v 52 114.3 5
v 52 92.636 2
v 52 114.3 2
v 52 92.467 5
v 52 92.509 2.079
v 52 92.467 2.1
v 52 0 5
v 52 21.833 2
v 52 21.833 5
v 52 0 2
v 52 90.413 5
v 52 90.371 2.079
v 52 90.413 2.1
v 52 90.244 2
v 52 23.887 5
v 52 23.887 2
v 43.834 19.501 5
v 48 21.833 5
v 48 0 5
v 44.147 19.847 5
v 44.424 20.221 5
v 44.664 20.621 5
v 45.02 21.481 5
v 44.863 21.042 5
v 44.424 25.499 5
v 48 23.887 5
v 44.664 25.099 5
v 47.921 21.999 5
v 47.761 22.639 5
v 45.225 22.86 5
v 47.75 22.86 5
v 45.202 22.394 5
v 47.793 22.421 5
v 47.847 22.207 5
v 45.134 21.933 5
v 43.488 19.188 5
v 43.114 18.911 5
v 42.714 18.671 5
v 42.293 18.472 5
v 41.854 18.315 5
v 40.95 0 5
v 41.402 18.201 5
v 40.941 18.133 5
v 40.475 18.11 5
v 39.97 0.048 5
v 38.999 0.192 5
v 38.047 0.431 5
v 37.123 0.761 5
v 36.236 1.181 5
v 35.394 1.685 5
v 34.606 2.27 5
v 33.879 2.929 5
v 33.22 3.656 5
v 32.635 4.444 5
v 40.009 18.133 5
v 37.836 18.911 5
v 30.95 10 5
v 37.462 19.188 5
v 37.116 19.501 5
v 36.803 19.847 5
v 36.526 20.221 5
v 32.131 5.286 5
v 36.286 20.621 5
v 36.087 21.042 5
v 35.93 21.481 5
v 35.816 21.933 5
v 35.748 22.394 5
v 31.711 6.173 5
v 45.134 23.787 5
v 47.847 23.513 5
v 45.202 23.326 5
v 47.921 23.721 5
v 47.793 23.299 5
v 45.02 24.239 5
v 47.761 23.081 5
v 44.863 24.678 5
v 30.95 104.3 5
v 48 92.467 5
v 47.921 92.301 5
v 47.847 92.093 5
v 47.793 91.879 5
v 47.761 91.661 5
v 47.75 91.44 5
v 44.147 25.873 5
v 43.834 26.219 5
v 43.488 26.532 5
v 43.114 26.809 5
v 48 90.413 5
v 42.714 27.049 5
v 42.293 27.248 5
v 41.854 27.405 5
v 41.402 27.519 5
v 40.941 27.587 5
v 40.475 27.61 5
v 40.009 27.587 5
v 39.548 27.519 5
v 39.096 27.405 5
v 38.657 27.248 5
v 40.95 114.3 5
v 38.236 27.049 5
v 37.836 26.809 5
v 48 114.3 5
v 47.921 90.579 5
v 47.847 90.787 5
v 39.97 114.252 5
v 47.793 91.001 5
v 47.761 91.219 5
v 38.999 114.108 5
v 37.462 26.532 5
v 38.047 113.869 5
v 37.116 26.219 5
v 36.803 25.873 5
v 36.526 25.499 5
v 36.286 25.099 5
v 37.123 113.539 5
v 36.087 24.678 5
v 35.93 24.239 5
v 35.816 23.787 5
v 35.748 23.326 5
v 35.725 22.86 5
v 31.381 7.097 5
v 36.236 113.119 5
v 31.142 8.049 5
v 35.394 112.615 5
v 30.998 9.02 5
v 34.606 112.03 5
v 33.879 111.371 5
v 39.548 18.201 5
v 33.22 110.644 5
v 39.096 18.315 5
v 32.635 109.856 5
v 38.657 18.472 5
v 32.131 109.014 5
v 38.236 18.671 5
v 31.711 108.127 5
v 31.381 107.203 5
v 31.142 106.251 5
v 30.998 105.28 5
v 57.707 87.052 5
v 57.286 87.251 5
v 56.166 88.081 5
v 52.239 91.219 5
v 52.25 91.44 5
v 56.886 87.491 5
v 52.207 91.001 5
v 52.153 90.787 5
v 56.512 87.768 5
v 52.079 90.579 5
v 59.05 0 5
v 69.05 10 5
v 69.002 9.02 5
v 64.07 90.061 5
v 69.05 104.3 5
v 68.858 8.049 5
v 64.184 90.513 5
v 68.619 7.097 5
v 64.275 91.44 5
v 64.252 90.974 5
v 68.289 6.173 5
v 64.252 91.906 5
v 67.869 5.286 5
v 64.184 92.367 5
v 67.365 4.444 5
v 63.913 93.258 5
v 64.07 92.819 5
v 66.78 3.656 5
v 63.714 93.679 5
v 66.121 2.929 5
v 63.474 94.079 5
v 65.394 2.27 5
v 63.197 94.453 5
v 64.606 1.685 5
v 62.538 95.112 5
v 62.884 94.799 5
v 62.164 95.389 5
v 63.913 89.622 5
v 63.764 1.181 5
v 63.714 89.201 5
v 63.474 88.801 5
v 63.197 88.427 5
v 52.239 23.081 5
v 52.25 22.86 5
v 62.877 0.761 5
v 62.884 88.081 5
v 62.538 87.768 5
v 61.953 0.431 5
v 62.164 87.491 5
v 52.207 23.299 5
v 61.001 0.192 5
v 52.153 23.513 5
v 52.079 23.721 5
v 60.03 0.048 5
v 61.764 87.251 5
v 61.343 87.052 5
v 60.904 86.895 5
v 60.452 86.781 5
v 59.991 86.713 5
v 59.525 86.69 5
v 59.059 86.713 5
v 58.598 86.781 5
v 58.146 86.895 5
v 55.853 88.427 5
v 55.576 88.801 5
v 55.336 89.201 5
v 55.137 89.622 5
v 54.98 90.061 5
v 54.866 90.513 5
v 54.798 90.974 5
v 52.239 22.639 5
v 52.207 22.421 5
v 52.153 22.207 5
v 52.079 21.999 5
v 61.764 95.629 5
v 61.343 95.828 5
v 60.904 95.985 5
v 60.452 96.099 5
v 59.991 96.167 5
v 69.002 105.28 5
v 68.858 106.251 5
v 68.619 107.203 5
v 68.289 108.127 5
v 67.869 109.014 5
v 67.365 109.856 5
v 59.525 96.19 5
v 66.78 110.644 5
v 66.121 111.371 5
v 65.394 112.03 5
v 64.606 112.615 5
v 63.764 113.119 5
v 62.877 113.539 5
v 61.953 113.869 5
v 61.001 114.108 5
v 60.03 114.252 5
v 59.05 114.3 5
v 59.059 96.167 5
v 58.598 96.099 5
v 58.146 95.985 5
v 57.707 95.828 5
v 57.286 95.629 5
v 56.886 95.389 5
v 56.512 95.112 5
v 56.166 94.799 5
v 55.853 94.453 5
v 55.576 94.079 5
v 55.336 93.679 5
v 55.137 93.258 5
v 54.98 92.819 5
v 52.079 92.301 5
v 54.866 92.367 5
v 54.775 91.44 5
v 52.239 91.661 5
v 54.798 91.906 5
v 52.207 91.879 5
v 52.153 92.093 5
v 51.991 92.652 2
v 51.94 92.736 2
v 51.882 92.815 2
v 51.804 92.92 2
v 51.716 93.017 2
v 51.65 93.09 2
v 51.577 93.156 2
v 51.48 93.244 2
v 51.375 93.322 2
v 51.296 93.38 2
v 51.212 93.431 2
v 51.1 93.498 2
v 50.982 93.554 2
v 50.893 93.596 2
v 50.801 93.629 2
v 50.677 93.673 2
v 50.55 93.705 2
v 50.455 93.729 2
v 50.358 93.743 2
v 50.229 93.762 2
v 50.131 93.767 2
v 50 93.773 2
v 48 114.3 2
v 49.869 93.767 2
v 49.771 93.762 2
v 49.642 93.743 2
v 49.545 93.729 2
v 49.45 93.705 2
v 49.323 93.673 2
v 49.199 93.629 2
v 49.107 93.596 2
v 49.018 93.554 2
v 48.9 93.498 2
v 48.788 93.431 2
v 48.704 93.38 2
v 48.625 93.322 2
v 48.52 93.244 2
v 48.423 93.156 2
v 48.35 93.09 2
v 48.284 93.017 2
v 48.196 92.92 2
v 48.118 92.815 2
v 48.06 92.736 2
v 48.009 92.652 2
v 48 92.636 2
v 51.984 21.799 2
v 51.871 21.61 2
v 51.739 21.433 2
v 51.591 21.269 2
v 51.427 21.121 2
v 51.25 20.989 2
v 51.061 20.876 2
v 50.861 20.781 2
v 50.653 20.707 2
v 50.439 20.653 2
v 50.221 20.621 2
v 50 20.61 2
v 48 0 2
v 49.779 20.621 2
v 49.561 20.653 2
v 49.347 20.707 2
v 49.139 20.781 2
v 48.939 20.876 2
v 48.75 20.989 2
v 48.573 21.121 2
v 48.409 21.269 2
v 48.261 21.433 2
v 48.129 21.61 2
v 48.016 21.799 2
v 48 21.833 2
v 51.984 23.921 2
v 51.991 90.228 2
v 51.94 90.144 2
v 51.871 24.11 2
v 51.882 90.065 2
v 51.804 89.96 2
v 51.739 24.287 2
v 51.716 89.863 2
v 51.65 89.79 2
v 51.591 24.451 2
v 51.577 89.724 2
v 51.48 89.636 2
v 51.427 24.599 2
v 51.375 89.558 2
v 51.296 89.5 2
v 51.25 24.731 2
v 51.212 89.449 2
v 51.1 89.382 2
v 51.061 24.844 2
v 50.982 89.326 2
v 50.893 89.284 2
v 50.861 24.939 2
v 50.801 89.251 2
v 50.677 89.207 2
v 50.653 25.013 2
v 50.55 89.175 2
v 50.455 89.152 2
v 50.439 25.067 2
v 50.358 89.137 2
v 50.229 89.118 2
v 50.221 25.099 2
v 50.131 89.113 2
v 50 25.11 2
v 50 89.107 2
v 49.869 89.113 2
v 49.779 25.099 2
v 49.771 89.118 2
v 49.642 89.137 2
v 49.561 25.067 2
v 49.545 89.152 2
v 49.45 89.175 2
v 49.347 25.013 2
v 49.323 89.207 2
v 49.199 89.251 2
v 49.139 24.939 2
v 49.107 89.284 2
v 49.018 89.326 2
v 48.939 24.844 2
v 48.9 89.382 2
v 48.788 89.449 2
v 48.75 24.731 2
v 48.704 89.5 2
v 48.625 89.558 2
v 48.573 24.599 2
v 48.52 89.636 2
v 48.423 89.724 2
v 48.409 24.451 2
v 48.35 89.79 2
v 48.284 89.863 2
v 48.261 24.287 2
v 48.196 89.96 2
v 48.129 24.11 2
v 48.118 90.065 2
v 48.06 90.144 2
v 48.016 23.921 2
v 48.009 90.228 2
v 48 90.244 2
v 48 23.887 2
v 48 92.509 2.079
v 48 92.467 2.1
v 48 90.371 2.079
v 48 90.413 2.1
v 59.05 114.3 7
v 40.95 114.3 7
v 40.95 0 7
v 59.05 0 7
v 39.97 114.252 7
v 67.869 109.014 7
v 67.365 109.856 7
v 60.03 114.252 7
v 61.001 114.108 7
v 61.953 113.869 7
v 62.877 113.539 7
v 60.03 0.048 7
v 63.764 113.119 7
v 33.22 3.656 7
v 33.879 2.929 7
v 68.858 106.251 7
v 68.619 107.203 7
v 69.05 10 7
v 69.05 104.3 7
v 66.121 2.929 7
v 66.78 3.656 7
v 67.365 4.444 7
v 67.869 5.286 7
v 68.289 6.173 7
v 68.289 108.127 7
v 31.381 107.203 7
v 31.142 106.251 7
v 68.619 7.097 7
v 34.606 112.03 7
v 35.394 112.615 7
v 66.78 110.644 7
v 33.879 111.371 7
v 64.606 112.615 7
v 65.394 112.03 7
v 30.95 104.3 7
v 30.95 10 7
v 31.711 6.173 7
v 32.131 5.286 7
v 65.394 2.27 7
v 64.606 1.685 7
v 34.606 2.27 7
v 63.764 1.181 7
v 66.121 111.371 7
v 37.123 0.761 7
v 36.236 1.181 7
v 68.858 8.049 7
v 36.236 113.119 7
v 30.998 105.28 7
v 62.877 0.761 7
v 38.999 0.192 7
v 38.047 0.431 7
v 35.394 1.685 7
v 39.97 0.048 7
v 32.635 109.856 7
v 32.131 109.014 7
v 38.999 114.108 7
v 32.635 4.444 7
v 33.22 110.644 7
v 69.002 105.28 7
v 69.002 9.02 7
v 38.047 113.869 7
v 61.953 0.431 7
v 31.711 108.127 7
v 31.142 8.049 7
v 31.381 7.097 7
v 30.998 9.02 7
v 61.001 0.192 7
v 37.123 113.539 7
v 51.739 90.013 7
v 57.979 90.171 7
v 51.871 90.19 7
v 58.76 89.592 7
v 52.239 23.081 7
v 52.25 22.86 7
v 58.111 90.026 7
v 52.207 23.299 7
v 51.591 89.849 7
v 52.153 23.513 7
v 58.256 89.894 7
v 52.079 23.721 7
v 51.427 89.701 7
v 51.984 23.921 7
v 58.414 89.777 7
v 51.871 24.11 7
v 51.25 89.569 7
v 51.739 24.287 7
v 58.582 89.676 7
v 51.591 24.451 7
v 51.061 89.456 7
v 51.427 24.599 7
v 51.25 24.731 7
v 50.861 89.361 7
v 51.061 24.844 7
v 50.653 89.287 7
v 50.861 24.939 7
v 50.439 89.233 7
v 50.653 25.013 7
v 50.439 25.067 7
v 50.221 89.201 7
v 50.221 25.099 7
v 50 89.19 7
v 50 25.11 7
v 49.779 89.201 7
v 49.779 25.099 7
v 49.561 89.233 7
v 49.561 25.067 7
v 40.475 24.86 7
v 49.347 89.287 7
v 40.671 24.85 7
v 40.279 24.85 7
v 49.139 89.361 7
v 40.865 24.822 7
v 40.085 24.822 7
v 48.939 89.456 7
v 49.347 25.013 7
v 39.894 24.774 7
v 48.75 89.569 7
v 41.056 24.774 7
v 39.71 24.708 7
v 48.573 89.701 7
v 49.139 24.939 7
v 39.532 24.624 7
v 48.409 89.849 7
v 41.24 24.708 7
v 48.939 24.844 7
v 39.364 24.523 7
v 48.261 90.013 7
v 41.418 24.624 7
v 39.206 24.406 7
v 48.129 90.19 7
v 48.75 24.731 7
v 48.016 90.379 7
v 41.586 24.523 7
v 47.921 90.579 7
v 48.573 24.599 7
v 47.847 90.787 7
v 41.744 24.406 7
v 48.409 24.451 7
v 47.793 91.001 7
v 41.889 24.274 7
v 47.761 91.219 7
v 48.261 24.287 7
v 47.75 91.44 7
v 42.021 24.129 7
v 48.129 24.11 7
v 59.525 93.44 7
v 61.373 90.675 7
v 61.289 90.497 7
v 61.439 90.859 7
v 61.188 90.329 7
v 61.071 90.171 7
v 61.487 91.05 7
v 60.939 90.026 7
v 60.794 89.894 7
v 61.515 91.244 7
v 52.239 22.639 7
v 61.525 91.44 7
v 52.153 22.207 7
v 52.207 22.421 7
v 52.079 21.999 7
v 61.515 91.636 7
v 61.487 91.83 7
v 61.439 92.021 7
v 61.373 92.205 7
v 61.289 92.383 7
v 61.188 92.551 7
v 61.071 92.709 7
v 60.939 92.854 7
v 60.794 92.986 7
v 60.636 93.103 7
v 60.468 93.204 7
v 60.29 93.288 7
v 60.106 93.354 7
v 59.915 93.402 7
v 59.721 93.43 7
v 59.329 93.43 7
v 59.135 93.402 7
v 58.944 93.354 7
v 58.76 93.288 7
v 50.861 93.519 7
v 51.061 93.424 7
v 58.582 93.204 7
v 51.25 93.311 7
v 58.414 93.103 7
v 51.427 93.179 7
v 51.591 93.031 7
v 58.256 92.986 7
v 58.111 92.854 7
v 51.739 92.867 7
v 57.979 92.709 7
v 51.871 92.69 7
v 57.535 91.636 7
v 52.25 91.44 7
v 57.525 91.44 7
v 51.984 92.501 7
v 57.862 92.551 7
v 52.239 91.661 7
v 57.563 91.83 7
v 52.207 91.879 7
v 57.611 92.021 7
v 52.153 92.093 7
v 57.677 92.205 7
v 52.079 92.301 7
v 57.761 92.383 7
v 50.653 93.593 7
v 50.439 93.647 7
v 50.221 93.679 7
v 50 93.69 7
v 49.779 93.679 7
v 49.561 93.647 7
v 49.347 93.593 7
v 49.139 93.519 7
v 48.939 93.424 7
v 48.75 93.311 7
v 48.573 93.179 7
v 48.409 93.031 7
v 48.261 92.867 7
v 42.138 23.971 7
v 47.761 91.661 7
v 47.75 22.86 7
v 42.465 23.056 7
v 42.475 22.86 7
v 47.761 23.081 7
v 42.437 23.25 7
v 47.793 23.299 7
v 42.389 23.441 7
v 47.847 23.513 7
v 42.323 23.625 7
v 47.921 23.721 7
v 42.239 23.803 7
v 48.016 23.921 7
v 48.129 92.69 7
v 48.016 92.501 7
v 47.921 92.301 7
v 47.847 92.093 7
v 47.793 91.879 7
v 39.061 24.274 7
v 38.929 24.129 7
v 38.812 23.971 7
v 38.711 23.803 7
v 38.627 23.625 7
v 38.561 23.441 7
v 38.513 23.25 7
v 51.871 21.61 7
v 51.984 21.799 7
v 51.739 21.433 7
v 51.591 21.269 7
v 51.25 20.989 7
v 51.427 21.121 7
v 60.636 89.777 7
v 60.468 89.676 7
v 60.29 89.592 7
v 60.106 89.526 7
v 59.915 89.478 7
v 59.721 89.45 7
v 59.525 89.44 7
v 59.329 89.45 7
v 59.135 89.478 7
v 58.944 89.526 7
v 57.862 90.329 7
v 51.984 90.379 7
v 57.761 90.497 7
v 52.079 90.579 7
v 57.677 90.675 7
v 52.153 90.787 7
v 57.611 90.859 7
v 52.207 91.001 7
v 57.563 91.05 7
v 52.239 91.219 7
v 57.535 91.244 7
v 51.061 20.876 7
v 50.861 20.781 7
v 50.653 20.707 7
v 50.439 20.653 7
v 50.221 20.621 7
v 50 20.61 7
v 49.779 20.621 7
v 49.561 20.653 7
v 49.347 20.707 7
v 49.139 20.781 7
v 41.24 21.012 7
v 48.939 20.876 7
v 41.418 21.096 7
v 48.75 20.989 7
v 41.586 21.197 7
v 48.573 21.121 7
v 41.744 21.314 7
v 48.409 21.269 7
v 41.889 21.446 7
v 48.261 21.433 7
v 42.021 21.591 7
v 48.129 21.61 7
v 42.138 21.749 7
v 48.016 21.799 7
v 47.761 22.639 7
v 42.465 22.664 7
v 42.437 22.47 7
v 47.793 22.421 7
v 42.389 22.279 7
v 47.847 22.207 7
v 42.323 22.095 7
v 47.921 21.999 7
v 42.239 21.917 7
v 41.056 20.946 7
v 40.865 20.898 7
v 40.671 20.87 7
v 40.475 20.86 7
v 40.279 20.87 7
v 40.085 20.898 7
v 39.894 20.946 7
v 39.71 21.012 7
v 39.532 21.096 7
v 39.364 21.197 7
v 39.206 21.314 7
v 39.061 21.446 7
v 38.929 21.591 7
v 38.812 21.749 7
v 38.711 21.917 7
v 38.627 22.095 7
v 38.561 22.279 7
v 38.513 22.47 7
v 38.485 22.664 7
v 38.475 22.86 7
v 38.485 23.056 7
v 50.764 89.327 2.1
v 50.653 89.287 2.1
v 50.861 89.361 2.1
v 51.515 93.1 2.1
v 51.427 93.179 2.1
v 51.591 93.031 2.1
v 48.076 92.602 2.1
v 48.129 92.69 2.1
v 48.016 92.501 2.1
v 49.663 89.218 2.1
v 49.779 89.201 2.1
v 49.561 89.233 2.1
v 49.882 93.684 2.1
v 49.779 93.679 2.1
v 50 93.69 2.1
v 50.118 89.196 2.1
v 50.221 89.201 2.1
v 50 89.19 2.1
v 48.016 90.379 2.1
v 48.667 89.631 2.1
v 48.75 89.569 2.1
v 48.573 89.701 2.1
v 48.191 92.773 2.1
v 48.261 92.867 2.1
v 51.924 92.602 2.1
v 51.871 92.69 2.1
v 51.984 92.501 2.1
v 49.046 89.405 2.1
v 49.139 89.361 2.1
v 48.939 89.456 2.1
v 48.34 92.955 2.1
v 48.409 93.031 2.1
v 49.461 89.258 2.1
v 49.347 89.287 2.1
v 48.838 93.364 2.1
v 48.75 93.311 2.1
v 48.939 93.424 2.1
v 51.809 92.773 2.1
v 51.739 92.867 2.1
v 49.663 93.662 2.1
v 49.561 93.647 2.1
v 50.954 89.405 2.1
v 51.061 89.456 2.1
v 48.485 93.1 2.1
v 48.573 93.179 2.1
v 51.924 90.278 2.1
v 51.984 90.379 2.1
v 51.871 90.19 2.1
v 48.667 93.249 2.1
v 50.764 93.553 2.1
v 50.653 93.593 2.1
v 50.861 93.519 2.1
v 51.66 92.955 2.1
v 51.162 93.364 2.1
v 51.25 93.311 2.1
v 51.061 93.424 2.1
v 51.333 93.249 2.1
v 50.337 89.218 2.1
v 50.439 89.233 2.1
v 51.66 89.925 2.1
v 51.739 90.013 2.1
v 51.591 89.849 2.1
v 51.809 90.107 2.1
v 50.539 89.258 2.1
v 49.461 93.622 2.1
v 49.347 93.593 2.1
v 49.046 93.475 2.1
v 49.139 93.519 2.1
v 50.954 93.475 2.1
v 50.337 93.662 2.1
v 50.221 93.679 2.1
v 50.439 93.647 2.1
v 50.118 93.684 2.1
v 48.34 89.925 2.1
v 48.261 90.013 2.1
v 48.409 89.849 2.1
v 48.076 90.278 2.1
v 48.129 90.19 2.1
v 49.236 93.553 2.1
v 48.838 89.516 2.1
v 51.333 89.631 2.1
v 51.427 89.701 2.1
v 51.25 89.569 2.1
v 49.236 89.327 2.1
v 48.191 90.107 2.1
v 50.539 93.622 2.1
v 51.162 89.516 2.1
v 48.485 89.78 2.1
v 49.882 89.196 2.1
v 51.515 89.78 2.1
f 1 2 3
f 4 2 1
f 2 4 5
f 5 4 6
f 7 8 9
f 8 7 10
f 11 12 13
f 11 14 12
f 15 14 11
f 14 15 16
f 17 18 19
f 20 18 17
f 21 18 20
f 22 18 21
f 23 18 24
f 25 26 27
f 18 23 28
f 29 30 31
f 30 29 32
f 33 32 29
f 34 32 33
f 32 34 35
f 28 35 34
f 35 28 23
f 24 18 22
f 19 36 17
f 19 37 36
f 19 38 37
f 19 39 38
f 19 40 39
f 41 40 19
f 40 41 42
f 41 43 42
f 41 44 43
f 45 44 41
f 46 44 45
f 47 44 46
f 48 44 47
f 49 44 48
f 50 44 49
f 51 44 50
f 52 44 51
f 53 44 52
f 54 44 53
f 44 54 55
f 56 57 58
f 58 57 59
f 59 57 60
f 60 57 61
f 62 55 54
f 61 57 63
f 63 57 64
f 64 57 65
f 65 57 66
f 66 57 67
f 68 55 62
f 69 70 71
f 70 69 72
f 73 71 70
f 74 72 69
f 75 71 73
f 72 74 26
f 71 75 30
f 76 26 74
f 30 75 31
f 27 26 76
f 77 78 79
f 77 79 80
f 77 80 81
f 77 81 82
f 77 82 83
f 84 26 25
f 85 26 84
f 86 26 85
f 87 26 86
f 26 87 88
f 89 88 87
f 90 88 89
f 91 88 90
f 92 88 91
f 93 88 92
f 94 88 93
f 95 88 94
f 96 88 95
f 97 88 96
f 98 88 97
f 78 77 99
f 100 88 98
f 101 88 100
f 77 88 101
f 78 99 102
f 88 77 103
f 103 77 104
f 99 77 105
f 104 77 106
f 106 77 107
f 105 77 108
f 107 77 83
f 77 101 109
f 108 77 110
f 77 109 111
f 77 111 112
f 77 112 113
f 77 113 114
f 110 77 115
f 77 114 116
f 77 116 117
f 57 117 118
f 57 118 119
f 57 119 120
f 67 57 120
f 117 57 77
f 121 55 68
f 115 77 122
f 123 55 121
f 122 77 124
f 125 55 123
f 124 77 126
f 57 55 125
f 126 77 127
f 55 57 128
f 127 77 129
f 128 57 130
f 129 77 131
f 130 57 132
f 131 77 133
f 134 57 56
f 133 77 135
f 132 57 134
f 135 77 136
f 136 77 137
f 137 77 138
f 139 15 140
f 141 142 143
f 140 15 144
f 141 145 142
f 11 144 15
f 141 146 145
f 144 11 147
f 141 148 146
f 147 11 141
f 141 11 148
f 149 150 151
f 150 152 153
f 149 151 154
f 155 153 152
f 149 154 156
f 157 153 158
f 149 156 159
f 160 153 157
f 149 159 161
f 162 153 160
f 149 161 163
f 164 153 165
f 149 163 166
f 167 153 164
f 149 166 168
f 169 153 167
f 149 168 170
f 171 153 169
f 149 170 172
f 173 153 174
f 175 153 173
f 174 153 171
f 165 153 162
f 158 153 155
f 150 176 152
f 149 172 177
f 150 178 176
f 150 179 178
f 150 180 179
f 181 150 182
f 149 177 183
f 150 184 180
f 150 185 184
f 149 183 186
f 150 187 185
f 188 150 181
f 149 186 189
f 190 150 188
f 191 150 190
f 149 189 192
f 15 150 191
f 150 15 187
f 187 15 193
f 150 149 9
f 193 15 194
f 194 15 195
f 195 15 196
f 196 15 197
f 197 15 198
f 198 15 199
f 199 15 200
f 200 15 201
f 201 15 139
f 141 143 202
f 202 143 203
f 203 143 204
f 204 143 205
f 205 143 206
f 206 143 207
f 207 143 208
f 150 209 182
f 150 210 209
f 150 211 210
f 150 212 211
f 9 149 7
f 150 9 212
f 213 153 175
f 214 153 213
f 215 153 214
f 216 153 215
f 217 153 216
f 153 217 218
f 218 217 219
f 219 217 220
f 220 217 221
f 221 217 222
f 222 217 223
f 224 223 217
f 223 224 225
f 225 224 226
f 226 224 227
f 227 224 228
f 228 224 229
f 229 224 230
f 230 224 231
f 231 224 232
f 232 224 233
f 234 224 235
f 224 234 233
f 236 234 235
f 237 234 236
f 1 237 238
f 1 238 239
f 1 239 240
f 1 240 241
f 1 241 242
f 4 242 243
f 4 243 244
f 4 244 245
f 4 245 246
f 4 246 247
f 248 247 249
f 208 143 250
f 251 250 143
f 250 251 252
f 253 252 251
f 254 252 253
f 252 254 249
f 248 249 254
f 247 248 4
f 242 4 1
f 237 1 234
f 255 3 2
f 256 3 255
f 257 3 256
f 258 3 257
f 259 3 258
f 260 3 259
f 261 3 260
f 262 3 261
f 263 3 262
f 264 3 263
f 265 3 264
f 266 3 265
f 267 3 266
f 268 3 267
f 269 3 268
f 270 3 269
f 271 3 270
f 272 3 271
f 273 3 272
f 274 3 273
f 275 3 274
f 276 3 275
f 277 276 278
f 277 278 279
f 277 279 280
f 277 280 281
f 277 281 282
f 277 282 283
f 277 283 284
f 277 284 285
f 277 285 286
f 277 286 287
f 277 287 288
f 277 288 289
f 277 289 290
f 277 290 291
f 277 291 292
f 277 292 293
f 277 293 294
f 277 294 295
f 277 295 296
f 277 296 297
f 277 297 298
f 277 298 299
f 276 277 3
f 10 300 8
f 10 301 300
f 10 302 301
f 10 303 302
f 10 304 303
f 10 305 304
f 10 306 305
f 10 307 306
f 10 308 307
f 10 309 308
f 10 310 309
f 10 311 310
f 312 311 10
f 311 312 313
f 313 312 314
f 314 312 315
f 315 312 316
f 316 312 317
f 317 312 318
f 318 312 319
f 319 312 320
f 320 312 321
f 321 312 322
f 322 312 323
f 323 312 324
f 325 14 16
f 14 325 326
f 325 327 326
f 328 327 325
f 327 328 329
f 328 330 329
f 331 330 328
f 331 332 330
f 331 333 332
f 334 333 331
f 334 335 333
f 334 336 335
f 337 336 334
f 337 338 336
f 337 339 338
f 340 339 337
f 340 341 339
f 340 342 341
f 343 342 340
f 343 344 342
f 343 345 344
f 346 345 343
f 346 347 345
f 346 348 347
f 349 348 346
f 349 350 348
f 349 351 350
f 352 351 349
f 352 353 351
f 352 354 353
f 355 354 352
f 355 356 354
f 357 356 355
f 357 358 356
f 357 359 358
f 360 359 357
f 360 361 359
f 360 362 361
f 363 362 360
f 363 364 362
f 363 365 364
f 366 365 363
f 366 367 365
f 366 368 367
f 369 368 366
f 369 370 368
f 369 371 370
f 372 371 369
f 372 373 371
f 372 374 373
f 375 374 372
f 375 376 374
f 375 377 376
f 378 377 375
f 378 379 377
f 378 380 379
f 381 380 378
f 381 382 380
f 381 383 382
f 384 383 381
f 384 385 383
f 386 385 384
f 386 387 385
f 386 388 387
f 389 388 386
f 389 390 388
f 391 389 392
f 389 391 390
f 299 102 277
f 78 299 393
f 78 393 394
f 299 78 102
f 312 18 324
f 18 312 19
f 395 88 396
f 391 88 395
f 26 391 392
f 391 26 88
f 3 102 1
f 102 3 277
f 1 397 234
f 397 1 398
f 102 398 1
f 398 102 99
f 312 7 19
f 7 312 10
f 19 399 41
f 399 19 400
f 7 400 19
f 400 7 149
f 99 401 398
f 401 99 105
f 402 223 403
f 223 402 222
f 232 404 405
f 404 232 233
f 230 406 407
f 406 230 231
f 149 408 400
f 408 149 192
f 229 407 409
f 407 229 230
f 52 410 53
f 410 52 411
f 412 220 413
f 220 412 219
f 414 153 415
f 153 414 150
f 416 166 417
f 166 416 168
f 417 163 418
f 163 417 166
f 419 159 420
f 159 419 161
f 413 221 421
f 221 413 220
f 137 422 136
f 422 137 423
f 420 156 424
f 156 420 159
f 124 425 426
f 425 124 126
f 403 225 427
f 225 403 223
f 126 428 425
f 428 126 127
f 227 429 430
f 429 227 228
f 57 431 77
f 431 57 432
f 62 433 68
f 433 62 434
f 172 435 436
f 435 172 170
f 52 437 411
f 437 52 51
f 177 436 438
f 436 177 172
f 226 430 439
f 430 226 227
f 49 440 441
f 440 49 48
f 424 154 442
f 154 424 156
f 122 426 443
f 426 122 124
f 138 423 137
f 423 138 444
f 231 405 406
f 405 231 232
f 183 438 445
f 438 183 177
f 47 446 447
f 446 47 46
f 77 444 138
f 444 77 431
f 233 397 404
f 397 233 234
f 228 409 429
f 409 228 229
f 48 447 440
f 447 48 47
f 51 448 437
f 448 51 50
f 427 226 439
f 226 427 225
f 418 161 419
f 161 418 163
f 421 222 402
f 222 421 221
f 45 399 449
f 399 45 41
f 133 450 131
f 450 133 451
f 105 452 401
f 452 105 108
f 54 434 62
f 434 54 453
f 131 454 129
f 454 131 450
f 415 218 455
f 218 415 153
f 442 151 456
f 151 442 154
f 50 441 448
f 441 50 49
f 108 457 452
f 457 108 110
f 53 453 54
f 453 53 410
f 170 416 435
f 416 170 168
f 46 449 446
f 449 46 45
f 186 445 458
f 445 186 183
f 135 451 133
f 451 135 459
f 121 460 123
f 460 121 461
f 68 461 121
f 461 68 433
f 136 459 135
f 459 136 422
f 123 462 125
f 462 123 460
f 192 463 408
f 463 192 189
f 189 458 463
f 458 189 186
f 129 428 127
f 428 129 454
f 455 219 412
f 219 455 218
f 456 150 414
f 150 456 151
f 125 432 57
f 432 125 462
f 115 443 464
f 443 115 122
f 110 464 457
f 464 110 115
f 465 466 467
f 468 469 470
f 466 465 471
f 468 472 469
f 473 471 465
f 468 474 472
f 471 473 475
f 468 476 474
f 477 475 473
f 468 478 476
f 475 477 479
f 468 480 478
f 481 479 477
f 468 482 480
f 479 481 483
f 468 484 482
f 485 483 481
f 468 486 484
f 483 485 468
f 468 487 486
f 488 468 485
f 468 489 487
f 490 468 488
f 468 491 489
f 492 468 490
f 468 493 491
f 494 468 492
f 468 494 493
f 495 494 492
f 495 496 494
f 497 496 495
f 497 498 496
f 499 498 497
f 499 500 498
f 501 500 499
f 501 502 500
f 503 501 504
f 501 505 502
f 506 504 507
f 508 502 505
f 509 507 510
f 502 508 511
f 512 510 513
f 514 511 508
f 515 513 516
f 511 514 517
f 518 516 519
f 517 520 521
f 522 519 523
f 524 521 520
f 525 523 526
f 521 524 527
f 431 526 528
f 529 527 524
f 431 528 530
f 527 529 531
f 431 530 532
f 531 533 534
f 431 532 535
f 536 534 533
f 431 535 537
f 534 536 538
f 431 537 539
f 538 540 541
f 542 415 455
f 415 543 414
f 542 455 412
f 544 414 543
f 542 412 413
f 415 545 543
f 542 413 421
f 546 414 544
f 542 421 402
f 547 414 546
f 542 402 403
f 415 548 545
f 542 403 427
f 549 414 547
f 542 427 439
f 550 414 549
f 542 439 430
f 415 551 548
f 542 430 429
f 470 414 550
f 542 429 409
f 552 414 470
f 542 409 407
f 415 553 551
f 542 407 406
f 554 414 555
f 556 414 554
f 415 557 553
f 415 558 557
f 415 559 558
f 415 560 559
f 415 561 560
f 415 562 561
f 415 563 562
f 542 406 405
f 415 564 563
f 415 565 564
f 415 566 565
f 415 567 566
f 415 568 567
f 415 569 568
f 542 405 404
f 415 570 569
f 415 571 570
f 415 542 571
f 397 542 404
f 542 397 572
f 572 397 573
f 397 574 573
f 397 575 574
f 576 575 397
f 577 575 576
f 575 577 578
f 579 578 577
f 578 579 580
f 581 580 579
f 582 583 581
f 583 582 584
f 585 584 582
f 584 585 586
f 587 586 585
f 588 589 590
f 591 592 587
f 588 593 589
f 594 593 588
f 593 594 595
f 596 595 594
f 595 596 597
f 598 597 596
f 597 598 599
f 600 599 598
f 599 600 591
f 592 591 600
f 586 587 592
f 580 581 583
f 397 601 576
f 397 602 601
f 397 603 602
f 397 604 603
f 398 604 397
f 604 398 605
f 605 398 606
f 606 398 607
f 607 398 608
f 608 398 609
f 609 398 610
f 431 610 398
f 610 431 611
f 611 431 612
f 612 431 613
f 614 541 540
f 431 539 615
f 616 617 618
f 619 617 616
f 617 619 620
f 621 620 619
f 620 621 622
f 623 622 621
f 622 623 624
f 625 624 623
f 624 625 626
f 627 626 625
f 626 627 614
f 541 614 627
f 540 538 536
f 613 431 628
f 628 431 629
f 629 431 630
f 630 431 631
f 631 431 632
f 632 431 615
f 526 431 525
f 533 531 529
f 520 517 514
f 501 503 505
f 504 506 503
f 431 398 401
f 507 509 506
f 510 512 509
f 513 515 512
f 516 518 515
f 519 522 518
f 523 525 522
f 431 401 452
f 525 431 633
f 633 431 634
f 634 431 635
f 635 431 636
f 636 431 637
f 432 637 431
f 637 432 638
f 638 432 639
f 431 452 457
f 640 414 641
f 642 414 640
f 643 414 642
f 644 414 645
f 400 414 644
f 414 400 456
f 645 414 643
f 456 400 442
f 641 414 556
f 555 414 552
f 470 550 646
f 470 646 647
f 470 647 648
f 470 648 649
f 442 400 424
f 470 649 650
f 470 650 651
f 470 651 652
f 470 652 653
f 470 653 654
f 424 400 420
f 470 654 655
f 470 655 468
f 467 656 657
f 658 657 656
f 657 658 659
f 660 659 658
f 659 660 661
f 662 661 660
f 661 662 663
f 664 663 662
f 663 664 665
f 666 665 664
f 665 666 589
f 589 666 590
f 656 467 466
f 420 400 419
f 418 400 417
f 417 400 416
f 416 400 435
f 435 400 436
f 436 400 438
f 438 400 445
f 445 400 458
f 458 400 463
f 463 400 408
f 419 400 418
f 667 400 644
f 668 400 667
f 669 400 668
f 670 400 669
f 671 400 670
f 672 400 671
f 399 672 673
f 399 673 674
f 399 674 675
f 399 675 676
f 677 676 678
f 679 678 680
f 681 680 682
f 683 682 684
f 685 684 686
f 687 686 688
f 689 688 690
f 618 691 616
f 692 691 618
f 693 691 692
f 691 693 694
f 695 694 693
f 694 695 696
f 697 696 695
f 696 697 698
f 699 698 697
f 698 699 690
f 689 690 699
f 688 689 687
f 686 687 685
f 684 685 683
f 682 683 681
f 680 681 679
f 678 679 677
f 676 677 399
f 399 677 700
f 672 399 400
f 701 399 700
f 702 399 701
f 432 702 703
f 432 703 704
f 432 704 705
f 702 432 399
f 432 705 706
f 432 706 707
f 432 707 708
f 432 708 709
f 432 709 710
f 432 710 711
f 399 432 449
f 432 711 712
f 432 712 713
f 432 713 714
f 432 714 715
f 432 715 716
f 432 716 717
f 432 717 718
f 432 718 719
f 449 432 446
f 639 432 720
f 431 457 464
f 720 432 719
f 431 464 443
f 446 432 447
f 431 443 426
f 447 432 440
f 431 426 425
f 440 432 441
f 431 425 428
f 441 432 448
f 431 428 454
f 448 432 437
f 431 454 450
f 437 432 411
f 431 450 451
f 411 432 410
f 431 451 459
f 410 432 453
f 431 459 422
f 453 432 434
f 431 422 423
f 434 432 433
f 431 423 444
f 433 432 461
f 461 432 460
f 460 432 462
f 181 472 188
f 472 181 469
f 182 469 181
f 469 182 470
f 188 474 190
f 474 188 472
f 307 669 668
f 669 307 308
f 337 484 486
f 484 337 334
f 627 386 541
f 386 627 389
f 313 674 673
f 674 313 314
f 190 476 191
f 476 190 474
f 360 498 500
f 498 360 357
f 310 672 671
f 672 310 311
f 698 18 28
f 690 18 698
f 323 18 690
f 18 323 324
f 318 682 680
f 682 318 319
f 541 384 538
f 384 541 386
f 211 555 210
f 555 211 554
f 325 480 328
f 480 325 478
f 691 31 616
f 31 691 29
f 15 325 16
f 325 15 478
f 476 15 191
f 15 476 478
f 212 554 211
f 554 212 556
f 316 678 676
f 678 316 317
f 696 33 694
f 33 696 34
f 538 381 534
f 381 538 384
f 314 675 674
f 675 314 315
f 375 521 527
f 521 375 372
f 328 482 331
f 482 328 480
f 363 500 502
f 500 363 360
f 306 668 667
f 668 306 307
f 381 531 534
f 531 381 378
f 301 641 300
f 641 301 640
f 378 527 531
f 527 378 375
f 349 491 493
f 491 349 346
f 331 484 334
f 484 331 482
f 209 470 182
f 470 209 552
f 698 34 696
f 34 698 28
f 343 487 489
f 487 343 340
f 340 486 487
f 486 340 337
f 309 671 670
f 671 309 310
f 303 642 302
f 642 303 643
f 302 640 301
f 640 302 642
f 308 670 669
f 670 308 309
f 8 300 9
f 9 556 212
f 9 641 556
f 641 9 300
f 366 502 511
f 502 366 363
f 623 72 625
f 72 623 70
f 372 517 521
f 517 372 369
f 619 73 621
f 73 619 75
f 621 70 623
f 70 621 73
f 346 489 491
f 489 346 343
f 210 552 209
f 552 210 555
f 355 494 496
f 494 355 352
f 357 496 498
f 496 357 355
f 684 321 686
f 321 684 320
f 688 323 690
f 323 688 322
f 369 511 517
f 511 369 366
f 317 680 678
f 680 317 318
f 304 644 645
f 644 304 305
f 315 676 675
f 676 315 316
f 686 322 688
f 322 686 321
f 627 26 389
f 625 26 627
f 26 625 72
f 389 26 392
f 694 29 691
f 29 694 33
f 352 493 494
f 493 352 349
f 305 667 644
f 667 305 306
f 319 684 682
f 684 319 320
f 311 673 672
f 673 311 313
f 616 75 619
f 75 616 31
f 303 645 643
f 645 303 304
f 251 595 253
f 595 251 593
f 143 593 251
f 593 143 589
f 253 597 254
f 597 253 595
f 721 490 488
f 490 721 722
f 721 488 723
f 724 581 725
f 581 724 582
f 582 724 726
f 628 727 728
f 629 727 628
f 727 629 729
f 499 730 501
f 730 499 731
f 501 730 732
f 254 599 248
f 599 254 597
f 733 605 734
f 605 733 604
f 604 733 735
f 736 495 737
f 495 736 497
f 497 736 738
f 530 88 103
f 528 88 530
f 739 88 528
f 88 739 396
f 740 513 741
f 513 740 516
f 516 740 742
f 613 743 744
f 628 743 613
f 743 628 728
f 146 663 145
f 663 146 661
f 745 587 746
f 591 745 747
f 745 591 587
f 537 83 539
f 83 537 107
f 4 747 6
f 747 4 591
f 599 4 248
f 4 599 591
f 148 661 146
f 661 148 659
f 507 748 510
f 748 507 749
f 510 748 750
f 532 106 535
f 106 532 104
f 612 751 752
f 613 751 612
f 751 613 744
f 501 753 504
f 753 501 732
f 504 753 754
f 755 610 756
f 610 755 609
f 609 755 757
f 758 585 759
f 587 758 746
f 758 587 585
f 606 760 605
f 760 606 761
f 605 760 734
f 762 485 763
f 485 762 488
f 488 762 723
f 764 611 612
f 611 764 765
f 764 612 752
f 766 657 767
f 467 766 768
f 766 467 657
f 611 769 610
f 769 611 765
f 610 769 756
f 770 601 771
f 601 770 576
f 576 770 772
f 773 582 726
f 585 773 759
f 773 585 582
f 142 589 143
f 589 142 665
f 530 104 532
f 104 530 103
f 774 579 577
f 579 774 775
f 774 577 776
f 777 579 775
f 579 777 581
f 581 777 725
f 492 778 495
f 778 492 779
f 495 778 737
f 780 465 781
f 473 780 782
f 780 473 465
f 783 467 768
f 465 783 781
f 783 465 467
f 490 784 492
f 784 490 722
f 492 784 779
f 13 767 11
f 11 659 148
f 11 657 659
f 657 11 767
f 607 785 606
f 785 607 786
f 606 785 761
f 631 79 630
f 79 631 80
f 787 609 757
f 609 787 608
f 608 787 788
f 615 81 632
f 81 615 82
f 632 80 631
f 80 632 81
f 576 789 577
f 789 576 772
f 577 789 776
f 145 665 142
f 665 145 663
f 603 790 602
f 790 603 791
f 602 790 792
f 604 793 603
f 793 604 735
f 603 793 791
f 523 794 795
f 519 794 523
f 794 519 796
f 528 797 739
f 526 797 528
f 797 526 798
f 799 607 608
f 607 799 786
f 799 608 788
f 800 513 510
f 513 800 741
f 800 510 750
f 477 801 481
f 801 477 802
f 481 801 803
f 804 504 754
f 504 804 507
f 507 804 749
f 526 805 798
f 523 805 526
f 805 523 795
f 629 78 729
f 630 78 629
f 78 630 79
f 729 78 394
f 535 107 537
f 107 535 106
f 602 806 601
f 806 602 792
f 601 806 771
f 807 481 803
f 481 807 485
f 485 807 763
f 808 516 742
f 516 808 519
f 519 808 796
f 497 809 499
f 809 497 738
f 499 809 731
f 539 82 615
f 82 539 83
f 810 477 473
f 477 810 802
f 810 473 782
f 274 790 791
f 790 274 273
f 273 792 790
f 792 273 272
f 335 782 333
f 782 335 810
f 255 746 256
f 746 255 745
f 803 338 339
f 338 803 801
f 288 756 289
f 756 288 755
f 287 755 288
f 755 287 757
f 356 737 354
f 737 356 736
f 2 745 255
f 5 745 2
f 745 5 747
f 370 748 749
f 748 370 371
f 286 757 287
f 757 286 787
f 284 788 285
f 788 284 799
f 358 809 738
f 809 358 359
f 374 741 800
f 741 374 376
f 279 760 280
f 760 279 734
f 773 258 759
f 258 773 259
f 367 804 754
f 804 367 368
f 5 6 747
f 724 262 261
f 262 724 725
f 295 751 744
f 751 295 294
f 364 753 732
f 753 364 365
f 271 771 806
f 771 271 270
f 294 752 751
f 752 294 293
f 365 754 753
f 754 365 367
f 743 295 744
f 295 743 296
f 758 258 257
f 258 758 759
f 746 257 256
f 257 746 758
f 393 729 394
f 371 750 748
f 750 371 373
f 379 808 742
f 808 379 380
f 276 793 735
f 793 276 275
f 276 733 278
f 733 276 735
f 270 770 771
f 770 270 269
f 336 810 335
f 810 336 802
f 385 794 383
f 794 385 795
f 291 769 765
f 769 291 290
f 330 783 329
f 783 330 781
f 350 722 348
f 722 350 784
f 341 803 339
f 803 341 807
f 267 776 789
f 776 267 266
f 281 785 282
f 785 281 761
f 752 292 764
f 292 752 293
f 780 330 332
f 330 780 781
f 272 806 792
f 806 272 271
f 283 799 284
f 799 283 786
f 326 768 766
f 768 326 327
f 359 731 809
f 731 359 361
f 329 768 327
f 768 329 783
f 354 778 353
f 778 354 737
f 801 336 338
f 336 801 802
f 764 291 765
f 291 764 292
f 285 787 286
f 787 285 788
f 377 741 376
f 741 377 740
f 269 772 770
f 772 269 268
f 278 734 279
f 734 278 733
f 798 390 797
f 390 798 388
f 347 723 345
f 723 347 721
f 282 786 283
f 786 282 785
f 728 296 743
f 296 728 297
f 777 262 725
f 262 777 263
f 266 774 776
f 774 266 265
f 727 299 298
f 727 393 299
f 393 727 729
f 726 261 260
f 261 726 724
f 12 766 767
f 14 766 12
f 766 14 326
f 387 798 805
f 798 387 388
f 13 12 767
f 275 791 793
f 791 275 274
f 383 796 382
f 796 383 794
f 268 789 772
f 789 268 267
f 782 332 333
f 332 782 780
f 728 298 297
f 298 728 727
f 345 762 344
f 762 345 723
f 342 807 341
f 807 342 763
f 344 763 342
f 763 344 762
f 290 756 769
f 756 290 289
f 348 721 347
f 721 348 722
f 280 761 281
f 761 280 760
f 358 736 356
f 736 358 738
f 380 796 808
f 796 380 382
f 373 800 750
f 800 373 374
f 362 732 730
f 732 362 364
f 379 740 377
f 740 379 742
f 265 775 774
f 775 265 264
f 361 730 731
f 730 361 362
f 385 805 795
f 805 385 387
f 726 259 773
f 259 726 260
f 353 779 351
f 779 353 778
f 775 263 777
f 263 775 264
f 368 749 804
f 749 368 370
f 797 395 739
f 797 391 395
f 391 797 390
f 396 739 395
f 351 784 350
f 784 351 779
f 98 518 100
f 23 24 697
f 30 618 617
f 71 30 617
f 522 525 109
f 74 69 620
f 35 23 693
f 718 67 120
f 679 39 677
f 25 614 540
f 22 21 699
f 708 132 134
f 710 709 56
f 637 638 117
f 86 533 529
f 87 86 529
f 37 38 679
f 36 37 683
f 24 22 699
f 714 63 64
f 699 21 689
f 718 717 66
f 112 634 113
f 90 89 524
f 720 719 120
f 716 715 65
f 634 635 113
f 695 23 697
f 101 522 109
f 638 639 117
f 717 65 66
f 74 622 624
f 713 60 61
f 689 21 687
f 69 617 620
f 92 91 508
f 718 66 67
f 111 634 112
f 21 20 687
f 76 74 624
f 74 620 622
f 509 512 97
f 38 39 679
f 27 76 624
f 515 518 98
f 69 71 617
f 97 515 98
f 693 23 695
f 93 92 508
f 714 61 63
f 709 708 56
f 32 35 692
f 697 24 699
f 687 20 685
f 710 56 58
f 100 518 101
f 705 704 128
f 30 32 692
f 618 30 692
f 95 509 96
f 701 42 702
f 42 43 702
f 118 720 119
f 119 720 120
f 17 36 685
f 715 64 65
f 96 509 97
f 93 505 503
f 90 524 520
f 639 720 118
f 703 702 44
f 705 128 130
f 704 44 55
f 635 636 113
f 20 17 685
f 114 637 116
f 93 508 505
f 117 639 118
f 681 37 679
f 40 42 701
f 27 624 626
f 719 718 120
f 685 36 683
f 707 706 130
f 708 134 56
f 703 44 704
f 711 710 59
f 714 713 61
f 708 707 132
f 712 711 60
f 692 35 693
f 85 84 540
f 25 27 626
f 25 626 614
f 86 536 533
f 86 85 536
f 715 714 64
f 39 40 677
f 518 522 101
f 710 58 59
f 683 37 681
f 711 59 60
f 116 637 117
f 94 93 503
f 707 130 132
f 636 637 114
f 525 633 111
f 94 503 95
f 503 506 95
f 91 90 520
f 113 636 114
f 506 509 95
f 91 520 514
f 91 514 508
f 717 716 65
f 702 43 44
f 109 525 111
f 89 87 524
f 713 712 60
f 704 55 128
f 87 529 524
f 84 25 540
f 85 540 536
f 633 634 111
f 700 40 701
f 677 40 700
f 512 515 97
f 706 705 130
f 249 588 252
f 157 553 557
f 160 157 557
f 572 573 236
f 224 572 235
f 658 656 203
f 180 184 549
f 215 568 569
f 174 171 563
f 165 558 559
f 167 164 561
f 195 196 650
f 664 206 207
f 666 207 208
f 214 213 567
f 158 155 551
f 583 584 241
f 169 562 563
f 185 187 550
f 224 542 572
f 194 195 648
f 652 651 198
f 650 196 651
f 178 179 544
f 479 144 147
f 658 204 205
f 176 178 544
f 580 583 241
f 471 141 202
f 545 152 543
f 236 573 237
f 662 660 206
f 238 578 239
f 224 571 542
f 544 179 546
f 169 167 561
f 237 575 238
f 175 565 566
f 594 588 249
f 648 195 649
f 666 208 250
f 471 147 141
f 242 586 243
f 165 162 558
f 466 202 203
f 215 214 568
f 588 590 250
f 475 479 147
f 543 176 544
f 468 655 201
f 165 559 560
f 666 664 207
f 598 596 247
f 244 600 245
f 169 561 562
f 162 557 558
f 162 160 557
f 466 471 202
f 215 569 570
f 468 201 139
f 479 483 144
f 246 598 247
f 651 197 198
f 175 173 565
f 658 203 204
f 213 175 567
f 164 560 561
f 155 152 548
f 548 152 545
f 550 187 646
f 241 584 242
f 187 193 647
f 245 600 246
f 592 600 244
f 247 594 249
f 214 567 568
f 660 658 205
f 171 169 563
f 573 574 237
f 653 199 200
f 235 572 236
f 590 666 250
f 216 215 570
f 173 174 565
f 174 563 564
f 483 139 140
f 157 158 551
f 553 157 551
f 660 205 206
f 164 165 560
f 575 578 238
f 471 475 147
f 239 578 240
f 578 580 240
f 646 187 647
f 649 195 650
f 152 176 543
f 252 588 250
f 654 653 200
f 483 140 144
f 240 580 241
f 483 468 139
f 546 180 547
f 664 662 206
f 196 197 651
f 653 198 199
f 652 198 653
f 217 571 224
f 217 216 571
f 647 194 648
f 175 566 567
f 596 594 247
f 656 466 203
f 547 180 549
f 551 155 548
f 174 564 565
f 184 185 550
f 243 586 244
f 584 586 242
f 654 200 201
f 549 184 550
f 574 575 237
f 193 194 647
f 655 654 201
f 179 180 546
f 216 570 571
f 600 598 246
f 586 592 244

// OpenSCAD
MM_PER_INCH = 25.4;
CLEARANCE_Z = 3;
SCREW_DIAM = 4;
SCREW_HEAD_DIAM = 9.5;
SCREW_HEAD_Z = 3.5;

TACK_SCREW_HEAD_DIAM = 8;
TACK_SCREW_DIAM = 3;
TACK_SCREW_HEAD_Z = 3;

CYLINDER_THICKNESS = 4;
TAB_THICKNESS = 2;
BRACKET_X = 1.5 * MM_PER_INCH;
BRACKET_Y = 0.5 * MM_PER_INCH;
FUDGE = 0.5;

IBEAM_X = BRACKET_X;
IBEAM_Y = 3 * BRACKET_X;
IBEAM_THICKNESS_Z = 2;

EDGE_CYL_DIAM = 4;

BIG_CYL_DIAM = 550;

module rounded_cube(x, y, z, diam) {
    translate([0.5 * x, 0.5 * y, 0]) hull() for(bx=[-1:2:1]) {
        for(by=[-1:2:1]) {
            translate([bx * (0.5 * (x - diam)), by * (0.5 * (y - diam)), 0]) cylinder(h=z, d=diam, $fn=64);
        }
    }
}

module ibeam_holes() {
    translate([0, 0.2 * IBEAM_Y, 0]) {
            union() {
                cylinder(d=SCREW_DIAM + FUDGE, h=(2 * IBEAM_THICKNESS_Z) + CLEARANCE_Z, $fn=64);
                cylinder(d1=SCREW_HEAD_DIAM, d2=SCREW_DIAM, h=IBEAM_THICKNESS_Z, $fn=64);
            }
        }
        translate([0, 0.8 * IBEAM_Y, 0]) {
            union() {
                cylinder(d=SCREW_DIAM + FUDGE, h=(2 * IBEAM_THICKNESS_Z) + CLEARANCE_Z, $fn=64);
                cylinder(d1=TACK_SCREW_HEAD_DIAM, d2=TACK_SCREW_DIAM, h=TACK_SCREW_HEAD_Z, $fn=64);
            }
        }
}

module ibeam(TOP) {
    difference() {
        translate([-0.5 * IBEAM_X, 0, 0])  union() {
            if (TOP == 1) {
                rounded_cube(IBEAM_X, IBEAM_Y, IBEAM_THICKNESS_Z, 20);
            }
            else {
                translate([(0.5 * (IBEAM_X - SCREW_DIAM)), 0, 0]) translate([0, 0, IBEAM_THICKNESS_Z]) cube([SCREW_DIAM, IBEAM_Y, CLEARANCE_Z]);
                translate([0, 0, IBEAM_THICKNESS_Z + CLEARANCE_Z]) rounded_cube(IBEAM_X, IBEAM_Y, IBEAM_THICKNESS_Z, 20);
            }
        }
        ibeam_holes();
        if (TOP == 0) {
            translate([-0.25 * IBEAM_X, 0.2 * IBEAM_Y, (IBEAM_THICKNESS_Z + CLEARANCE_Z)]) cylinder(d1=SCREW_HEAD_DIAM, d2=SCREW_DIAM, h=IBEAM_THICKNESS_Z, $fn=64);
            translate([0.25 * IBEAM_X, 0.8 * IBEAM_Y, (IBEAM_THICKNESS_Z + CLEARANCE_Z)]) cylinder(d1=SCREW_HEAD_DIAM, d2=SCREW_DIAM, h=IBEAM_THICKNESS_Z, $fn=64);
        }
    }
}

module clip() {
    intersection() {
        difference() {
            union() {
                
                /*
                intersection() {
                    cylinder(d=BRACKET_Y, h=CLEARANCE_Z, $fn=64);
                    translate([0, 0, 0.5 * CLEARANCE_Z]) cube([SCREW_DIAM, BRACKET_Y, CLEARANCE_Z], center=true);
                }
                */
                translate([0, 0, -1 * TAB_THICKNESS]) hull() {
                    for(bx=[-1:2:1]) {
                        for(by=[-1:2:1]) {
                            translate([bx * (0.5 * (BRACKET_X - EDGE_CYL_DIAM)), by * (0.5 * (BRACKET_Y - EDGE_CYL_DIAM)), 0]) cylinder(h=TAB_THICKNESS, d=EDGE_CYL_DIAM, $fn=64);
                        }
                    }
                }
                
            }
            translate([0, 0, -1 * TAB_THICKNESS]) union() {
                cylinder(d=SCREW_DIAM + FUDGE, h=CLEARANCE_Z + CYLINDER_THICKNESS, $fn=64);
                //cylinder(d1=SCREW_HEAD_DIAM, d2=SCREW_DIAM, h=SCREW_HEAD_Z, $fn=64);
            }
        }
        //translate([0, 0.5 * BRACKET_Y, (0.5 * BIG_CYL_DIAM) - TAB_THICKNESS]) rotate([90, 0, 0]) cylinder(d=BIG_CYL_DIAM, h=BRACKET_Y, $fn=128);
    }
}

//ibeam(1);

translate([50, 0, 0]) ibeam(0);

// edge clip
/*
intersection() {
    clip();
    union() {
        translate([0, 0, -1 * TAB_THICKNESS]) cylinder(d=BRACKET_Y, h=CLEARANCE_Z + TAB_THICKNESS, $fn=64);
        translate([0, -0.5 * BRACKET_Y, -1 * TAB_THICKNESS]) cube([0.5 * BRACKET_X, BRACKET_Y, CLEARANCE_Z + TAB_THICKNESS]);
    }
}
*/


// middle clip
//translate([0, 2 * BRACKET_Y, 0]) clip();
